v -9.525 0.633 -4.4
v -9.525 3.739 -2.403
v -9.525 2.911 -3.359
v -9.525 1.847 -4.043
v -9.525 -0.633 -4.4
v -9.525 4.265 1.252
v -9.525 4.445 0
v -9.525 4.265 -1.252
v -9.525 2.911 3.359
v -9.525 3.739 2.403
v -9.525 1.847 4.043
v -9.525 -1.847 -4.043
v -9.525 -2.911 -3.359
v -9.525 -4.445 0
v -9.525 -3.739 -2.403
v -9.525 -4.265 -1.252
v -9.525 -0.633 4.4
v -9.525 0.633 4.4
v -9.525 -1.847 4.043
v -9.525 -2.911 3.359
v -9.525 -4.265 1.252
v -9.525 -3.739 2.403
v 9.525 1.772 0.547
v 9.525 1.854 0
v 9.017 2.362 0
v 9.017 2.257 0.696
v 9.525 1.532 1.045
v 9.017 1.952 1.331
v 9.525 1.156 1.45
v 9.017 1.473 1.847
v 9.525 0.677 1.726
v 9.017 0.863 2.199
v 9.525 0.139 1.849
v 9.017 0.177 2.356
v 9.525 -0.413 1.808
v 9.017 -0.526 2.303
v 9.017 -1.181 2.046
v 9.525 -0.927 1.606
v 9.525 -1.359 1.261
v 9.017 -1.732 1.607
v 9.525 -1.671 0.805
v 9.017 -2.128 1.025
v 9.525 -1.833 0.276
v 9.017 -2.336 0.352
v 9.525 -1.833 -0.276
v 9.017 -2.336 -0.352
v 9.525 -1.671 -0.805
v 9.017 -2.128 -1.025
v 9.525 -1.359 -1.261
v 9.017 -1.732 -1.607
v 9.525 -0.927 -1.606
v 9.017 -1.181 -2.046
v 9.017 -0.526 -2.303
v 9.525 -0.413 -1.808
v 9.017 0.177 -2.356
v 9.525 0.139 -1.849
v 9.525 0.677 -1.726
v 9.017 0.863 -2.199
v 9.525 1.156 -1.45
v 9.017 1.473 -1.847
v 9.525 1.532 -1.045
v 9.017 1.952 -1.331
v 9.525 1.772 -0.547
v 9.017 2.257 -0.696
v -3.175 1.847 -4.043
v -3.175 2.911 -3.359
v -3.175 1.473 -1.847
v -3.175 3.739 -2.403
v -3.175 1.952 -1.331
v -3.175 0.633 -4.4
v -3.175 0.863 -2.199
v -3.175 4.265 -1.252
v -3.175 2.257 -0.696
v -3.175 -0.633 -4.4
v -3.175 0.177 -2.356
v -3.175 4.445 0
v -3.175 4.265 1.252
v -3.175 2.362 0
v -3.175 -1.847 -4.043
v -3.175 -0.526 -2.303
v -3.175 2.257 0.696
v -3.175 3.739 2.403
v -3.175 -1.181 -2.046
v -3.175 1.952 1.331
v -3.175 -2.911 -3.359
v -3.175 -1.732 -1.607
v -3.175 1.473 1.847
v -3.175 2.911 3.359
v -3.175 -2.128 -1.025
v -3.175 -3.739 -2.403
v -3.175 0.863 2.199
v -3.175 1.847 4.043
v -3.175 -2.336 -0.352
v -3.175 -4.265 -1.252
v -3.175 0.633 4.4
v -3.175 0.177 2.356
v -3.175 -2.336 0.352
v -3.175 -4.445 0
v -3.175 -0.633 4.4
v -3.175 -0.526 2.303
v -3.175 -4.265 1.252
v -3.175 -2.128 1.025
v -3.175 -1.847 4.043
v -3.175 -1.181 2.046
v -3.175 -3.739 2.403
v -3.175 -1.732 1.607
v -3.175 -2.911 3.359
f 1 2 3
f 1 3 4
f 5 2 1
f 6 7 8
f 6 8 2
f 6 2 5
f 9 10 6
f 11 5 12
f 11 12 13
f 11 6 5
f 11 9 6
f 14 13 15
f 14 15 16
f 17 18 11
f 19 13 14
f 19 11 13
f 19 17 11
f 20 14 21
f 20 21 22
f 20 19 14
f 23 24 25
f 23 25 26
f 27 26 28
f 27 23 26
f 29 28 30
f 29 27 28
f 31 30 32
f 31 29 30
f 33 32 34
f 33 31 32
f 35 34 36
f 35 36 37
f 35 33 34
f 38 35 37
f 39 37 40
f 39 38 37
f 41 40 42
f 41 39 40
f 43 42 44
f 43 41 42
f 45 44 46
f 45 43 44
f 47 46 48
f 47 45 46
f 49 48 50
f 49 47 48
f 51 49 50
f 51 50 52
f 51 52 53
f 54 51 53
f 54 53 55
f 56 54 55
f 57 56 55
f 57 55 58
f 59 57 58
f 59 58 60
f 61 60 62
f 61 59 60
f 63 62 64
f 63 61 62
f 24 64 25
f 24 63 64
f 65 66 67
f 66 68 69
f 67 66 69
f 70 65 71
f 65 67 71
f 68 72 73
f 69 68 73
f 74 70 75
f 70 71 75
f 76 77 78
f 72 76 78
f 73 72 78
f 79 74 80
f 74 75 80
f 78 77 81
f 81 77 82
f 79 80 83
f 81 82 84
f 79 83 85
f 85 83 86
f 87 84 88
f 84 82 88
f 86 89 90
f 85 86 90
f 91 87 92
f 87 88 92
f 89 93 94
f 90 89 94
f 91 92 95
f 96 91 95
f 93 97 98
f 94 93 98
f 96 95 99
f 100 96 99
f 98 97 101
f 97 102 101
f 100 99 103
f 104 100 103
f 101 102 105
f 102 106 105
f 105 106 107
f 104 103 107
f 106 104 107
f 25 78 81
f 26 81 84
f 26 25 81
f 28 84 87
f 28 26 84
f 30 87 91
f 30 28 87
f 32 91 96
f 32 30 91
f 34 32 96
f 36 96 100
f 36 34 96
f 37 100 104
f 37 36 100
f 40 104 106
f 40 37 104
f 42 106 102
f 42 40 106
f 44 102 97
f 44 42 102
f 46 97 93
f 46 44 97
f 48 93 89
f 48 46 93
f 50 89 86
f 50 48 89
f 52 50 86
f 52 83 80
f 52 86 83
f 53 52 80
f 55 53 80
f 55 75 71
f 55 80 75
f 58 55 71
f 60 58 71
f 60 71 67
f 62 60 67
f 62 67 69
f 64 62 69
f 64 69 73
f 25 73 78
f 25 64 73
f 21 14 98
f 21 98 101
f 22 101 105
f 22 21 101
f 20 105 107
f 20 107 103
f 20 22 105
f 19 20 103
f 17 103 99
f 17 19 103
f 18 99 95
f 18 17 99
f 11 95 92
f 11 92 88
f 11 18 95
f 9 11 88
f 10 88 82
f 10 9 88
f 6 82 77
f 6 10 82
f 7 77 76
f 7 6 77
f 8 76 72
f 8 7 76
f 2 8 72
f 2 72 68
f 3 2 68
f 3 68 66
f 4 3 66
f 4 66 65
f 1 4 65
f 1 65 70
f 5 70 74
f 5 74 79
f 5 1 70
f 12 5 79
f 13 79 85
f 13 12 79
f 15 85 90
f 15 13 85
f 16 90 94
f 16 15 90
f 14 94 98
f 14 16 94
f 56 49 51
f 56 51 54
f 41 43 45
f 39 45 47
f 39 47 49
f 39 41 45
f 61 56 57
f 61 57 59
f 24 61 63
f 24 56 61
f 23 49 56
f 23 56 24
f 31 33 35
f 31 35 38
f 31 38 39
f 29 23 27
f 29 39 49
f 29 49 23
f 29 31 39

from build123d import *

# Parameters (mm, degrees)
F0_R     = 2.3622
F1_DEPTH = 9.525
F2_R     = 4.445
F2_R_2   = 2.3622
F3_DEPTH = 6.35
F4_SIZE  = 0.508


with BuildPart() as f1:
    # F0 (on Right) → F1 (new body, symmetric)
    with BuildSketch(Plane.YZ):
        Circle(F0_R)
    extrude(amount=F1_DEPTH, both=True)

    # F2 (on face) → F3 (join)
    with BuildSketch(Plane(origin=(-9.525, 0, 0), x_dir=(0, -1, 0), z_dir=(-1, 0, 0))):
        Circle(F2_R)
        Circle(F2_R_2, mode=Mode.SUBTRACT)
    extrude(amount=-F3_DEPTH)

    # F4
    f4_edges = [f1.edges().sort_by_distance(p)[0] for p in [
        (9.525, -2.3622, 0),
    ]]
    chamfer(f4_edges, length=F4_SIZE)


solid = f1.part
